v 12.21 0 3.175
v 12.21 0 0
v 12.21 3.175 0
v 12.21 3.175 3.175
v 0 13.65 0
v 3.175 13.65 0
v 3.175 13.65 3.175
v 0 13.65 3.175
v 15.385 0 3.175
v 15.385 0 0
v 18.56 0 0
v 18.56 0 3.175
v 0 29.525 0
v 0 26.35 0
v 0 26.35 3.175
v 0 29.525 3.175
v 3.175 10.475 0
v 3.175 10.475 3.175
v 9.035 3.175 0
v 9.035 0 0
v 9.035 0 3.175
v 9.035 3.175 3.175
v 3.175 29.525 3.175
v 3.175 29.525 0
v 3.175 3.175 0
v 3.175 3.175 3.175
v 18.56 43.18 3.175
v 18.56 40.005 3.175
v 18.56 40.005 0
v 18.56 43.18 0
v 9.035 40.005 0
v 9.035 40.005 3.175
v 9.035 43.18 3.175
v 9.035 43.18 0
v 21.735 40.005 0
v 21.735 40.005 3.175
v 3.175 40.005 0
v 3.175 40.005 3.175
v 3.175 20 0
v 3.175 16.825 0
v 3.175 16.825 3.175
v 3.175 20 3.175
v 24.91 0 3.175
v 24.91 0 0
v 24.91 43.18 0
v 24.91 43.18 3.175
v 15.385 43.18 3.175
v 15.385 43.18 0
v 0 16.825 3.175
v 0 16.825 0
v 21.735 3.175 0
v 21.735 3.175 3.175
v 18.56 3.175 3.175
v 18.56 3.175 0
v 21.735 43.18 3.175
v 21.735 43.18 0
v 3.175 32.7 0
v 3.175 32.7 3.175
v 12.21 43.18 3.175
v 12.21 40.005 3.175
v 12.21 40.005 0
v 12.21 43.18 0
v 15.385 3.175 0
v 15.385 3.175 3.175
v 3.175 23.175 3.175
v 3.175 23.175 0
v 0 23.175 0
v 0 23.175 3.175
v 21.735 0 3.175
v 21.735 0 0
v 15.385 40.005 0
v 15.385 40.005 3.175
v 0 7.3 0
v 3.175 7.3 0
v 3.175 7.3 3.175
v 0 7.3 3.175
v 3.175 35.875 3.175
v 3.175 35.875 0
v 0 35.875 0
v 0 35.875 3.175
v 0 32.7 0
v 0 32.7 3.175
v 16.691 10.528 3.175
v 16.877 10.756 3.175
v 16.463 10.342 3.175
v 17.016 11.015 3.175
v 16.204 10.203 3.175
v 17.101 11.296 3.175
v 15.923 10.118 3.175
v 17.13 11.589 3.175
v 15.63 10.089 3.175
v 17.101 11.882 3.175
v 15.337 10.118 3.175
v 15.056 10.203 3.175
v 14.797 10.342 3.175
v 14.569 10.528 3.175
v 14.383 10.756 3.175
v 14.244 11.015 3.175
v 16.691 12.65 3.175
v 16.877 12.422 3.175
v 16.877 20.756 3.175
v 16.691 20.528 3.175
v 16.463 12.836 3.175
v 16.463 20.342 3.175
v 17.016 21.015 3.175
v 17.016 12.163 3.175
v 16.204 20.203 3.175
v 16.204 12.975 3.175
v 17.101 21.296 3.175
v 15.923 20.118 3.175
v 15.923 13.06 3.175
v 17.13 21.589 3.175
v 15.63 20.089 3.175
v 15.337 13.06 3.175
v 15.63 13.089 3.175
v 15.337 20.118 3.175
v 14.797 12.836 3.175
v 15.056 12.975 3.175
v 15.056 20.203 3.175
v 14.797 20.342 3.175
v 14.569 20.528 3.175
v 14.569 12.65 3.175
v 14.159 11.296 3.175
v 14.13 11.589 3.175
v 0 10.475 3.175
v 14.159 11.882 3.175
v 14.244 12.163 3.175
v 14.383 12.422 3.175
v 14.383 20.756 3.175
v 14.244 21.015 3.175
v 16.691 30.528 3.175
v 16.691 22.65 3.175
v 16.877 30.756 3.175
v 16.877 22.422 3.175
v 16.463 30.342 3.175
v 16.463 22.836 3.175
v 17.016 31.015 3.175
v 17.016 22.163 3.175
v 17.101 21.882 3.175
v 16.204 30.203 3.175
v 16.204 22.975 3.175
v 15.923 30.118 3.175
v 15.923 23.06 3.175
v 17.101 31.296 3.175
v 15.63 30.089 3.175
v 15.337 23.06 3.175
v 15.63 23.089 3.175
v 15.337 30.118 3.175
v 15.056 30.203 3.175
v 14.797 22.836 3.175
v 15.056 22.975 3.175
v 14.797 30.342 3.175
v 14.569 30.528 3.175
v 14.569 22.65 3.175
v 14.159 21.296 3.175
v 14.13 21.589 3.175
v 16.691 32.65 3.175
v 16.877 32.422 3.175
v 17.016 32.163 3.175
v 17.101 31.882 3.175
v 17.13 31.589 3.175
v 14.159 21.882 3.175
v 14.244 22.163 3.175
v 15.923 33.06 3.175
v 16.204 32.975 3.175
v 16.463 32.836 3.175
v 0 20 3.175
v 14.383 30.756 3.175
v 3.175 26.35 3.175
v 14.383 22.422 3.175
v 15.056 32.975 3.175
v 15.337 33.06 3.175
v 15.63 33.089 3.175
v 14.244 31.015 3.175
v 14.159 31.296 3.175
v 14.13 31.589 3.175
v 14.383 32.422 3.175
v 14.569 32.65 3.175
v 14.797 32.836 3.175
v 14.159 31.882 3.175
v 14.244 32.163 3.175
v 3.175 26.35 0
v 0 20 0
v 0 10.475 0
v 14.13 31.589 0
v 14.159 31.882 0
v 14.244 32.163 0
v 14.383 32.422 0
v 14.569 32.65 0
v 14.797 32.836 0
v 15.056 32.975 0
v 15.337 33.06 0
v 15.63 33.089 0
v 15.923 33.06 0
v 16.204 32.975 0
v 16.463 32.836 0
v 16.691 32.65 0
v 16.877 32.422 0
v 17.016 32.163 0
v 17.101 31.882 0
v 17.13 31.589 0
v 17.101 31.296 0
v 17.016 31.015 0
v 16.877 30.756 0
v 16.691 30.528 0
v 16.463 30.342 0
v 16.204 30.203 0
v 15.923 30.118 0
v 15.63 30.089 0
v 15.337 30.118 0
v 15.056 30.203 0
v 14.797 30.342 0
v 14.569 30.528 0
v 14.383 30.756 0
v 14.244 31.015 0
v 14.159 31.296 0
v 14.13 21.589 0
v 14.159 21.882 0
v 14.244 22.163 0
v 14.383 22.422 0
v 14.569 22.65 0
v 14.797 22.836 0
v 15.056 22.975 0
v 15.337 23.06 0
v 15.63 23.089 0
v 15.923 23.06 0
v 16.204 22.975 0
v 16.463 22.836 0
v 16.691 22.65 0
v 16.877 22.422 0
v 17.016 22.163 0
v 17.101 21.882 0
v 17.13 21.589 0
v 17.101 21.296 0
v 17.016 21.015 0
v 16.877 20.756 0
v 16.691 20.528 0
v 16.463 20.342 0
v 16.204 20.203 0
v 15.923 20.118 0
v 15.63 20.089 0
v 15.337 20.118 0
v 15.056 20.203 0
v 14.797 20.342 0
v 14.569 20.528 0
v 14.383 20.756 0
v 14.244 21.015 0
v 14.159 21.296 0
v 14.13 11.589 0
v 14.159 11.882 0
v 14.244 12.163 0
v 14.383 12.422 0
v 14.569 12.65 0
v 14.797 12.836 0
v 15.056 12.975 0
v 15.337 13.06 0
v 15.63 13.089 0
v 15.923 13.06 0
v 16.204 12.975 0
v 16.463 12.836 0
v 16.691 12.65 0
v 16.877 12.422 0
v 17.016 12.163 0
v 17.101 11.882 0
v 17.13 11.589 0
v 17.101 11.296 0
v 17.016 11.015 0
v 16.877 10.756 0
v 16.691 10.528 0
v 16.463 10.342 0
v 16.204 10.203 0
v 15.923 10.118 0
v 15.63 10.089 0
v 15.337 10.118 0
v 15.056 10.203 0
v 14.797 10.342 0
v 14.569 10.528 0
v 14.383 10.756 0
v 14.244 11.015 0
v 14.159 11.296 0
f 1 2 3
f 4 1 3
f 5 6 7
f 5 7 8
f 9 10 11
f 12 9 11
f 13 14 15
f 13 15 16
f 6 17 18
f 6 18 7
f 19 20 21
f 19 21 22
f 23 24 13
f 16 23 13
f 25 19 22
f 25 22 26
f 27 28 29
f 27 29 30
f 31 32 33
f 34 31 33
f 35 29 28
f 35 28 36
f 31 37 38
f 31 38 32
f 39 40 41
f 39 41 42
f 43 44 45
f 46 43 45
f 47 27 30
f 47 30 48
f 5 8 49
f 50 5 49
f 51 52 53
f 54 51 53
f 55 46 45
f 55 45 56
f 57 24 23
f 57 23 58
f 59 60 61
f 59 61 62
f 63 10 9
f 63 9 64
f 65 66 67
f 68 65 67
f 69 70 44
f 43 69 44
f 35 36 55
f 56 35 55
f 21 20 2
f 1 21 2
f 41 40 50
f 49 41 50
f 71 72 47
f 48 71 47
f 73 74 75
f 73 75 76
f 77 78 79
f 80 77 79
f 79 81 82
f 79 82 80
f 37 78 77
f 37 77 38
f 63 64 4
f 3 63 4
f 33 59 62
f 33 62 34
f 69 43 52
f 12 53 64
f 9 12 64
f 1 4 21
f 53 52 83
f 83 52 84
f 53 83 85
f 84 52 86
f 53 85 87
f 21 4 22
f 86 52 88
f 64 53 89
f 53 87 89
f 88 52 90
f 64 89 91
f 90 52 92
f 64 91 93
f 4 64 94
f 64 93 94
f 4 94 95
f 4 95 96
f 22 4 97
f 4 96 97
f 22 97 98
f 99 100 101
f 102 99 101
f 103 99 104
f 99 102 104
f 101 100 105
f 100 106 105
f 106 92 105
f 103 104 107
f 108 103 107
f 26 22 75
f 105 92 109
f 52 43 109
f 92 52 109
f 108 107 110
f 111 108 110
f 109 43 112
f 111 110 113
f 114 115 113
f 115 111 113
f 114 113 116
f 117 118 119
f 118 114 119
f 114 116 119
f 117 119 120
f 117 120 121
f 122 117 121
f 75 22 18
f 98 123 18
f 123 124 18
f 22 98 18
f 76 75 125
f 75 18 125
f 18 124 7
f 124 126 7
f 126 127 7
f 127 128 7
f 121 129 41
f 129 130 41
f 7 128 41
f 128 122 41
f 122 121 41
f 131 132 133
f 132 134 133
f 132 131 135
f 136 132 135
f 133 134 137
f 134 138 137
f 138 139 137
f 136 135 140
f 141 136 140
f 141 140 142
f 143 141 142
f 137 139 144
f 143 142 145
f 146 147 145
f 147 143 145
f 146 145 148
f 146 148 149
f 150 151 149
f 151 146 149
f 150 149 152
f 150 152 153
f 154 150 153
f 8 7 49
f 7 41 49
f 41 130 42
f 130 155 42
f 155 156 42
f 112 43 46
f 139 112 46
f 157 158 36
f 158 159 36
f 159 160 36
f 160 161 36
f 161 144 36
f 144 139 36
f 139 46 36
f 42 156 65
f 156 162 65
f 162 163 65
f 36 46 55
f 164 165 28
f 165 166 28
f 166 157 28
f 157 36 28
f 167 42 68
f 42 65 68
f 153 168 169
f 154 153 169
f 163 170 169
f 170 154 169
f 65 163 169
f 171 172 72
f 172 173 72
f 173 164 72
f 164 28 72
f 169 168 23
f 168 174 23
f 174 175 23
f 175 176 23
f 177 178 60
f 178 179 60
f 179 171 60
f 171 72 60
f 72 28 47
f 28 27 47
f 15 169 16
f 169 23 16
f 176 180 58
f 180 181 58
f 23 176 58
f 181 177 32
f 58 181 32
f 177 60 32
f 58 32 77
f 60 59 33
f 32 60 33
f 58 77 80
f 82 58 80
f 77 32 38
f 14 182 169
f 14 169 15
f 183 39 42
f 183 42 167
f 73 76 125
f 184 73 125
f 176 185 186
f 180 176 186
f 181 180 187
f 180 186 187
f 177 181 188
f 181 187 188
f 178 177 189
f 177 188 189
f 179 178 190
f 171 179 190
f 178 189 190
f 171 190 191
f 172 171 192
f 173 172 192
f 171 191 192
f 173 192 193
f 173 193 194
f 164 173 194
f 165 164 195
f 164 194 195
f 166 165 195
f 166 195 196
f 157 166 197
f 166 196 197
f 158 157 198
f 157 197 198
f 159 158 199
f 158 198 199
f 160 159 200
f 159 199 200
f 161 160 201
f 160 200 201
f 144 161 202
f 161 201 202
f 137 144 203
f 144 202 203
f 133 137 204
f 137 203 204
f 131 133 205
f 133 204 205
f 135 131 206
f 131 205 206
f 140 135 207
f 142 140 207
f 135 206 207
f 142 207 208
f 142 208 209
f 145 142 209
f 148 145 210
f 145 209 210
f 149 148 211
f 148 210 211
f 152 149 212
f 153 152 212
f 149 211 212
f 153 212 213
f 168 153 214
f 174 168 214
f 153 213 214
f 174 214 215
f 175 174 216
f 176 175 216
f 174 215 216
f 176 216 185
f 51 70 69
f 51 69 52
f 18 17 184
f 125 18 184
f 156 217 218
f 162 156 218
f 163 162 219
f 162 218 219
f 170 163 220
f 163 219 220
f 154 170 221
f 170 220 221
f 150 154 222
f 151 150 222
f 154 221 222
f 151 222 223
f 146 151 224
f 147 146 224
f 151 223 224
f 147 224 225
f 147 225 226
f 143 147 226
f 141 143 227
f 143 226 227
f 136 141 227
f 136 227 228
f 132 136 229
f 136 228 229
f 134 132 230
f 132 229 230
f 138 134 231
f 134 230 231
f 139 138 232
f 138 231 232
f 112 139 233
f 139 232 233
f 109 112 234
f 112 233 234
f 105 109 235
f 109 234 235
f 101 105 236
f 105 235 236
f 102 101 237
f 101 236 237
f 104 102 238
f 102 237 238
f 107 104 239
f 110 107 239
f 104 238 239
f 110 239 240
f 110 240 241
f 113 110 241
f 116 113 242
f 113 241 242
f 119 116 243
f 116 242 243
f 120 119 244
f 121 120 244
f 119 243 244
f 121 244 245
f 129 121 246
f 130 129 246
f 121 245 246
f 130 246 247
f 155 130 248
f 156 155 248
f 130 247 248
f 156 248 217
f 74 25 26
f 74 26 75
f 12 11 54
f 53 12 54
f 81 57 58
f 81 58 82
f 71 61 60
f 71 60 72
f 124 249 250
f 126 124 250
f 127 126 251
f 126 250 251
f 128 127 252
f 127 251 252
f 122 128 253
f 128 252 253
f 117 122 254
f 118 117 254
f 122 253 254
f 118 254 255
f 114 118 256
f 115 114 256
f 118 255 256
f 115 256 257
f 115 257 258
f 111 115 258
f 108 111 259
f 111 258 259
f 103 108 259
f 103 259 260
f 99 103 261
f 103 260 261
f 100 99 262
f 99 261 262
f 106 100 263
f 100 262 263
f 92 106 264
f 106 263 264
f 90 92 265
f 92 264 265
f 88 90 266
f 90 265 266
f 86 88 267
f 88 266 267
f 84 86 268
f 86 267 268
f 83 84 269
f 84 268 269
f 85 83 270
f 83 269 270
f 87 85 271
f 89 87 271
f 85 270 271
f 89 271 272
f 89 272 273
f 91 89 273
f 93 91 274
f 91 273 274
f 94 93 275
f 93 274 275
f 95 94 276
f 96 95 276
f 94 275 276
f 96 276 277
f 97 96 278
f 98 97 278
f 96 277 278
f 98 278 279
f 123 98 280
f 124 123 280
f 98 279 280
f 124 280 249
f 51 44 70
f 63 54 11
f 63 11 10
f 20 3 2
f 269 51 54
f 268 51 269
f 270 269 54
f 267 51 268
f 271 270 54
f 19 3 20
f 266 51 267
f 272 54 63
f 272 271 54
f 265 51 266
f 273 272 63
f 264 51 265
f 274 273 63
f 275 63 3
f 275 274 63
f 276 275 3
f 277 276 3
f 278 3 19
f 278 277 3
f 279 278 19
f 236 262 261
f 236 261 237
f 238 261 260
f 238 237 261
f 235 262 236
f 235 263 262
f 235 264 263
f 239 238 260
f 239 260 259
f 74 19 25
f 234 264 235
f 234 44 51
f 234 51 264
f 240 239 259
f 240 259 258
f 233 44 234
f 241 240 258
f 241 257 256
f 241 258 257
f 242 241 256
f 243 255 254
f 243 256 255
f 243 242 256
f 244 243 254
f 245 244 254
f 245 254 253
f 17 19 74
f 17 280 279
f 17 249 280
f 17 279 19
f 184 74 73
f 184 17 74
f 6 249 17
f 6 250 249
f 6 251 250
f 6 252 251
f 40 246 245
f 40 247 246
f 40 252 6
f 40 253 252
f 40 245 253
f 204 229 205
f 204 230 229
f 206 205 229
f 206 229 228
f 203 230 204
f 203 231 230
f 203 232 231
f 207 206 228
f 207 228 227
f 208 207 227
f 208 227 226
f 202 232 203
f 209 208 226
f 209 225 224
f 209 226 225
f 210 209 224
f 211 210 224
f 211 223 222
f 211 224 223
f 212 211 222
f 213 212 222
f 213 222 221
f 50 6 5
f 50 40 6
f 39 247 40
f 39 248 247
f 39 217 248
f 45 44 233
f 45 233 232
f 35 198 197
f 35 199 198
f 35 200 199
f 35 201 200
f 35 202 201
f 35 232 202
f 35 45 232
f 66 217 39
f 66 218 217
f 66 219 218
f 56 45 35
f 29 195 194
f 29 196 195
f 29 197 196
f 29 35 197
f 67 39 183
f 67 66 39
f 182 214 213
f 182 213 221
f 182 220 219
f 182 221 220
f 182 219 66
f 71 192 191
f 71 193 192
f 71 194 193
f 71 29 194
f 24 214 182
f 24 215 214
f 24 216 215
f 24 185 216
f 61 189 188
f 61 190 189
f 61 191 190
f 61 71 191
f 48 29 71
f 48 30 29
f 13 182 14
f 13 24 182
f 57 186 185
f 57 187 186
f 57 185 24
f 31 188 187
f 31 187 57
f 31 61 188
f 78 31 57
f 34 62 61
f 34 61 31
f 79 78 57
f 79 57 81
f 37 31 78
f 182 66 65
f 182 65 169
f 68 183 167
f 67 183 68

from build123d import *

# Parameters (mm, degrees)
SKETCH1_W            = 24.91
SKETCH1_H            = 40.005
BOSS_EXTRUDE1_DEPTH  = 3.175
SKETCH7_W            = 3.175
SKETCH7_H            = 3.175
CUT_EXTRUDE5_DEPTH   = 3.175
LPATTERN2_COUNT      = 6
LPATTERN2_PITCH      = 6.35
LPATTERN2_COUNT_DIR2 = 6
LPATTERN2_PITCH_DIR2 = 6.35
SKETCH8_W            = 3.175
SKETCH8_H            = 0.955
SKETCH8_H_2          = 3.175
CUT_EXTRUDE6_DEPTH   = 3.175
SKETCH9_W            = 3.175
SKETCH9_H            = 3.175
CUT_EXTRUDE7_DEPTH   = 3.175
LPATTERN3_COUNT      = 3
LPATTERN3_PITCH      = 6.35
SKETCH10_W           = 2.685
SKETCH10_H           = 3.175
CUT_EXTRUDE8_DEPTH   = 3.175
SKETCH12_W           = 3.175
SKETCH12_H           = 3.175
BOSS_EXTRUDE2_DEPTH  = 3.175
LPATTERN4_COUNT      = 3
LPATTERN4_PITCH      = 6.35
SKETCH11_R           = 1.5
CUT_EXTRUDE9_DEPTH   = 3.175
LPATTERN5_COUNT      = 3
LPATTERN5_PITCH      = 10


with BuildPart() as part:
    # Sketch1 → Boss-Extrude1 (new body)
    with BuildSketch(Plane.XY):
        with Locations((12.455, 20.0025)):
            Rectangle(SKETCH1_W, SKETCH1_H)
    extrude(amount=BOSS_EXTRUDE1_DEPTH)

    # Sketch7 → Cut-Extrude5 (cut)
    with BuildSketch(Plane(origin=(0, 0, 0), x_dir=(-1, 0, 0), z_dir=(0, 0, -1))):
        with Locations((-1.5875, 31.1125)):
            Rectangle(SKETCH7_W, SKETCH7_H)
    cut_extrude5 = extrude(amount=-CUT_EXTRUDE5_DEPTH, mode=Mode.SUBTRACT)

    # LPattern2: Cut-Extrude5 6 × 6
    with Locations(*[Vector(0, -1, 0) * (i * LPATTERN2_PITCH) + Vector(0, 1, 0) * (j * LPATTERN2_PITCH_DIR2) for i in range(LPATTERN2_COUNT) for j in range(LPATTERN2_COUNT_DIR2) if (i, j) != (0, 0)]):
        add(cut_extrude5, mode=Mode.SUBTRACT)

    # Sketch8 → Cut-Extrude6 (cut)
    with BuildSketch(Plane(origin=(0, 0, 0), x_dir=(-1, 0, 0), z_dir=(0, 0, -1))):
        with Locations((-1.5875, 39.5275)):
            Rectangle(SKETCH8_W, SKETCH8_H)
        with Locations((-1.5875, 2.5375)):
            Rectangle(SKETCH8_W, SKETCH8_H_2)
    extrude(amount=-CUT_EXTRUDE6_DEPTH, mode=Mode.SUBTRACT)

    # Sketch9 → Cut-Extrude7 (cut)
    with BuildSketch(Plane(origin=(0, 0, 0), x_dir=(-1, 0, 0), z_dir=(0, 0, -1))):
        with Locations((-20.1475, 1.5875)):
            Rectangle(SKETCH9_W, SKETCH9_H)
    cut_extrude7 = extrude(amount=-CUT_EXTRUDE7_DEPTH, mode=Mode.SUBTRACT)

    # LPattern3: Cut-Extrude7 ×3
    with Locations(*[(-i * LPATTERN3_PITCH, 0, 0) for i in range(1, LPATTERN3_COUNT)]):
        add(cut_extrude7, mode=Mode.SUBTRACT)

    # Sketch10 → Cut-Extrude8 (cut)
    with BuildSketch(Plane(origin=(0, 0, 0), x_dir=(-1, 0, 0), z_dir=(0, 0, -1))):
        with Locations((-4.5175, 1.5875)):
            Rectangle(SKETCH10_W, SKETCH10_H)
    extrude(amount=-CUT_EXTRUDE8_DEPTH, mode=Mode.SUBTRACT)

    # Sketch12 → Boss-Extrude2 (add)
    with BuildSketch(Plane(origin=(0, 0, 0), x_dir=(-1, 0, 0), z_dir=(0, 0, -1))):
        with Locations((-23.3225, 41.5925)):
            Rectangle(SKETCH12_W, SKETCH12_H)
    boss_extrude2 = extrude(amount=-BOSS_EXTRUDE2_DEPTH)

    # LPattern4: Boss-Extrude2 ×3
    with Locations(*[(-i * LPATTERN4_PITCH, 0, 0) for i in range(1, LPATTERN4_COUNT)]):
        add(boss_extrude2)

    # Sketch11 → Cut-Extrude9 (cut)
    with BuildSketch(Plane(origin=(0, 0, 0), x_dir=(-1, 0, 0), z_dir=(0, 0, -1))):
        with Locations((-15.63, 31.589068697)):
            Circle(SKETCH11_R)
    cut_extrude9 = extrude(amount=-CUT_EXTRUDE9_DEPTH, mode=Mode.SUBTRACT)

    # LPattern5: Cut-Extrude9 ×3
    with Locations(*[(0, -i * LPATTERN5_PITCH, 0) for i in range(1, LPATTERN5_COUNT)]):
        add(cut_extrude9, mode=Mode.SUBTRACT)


solid = part.part
